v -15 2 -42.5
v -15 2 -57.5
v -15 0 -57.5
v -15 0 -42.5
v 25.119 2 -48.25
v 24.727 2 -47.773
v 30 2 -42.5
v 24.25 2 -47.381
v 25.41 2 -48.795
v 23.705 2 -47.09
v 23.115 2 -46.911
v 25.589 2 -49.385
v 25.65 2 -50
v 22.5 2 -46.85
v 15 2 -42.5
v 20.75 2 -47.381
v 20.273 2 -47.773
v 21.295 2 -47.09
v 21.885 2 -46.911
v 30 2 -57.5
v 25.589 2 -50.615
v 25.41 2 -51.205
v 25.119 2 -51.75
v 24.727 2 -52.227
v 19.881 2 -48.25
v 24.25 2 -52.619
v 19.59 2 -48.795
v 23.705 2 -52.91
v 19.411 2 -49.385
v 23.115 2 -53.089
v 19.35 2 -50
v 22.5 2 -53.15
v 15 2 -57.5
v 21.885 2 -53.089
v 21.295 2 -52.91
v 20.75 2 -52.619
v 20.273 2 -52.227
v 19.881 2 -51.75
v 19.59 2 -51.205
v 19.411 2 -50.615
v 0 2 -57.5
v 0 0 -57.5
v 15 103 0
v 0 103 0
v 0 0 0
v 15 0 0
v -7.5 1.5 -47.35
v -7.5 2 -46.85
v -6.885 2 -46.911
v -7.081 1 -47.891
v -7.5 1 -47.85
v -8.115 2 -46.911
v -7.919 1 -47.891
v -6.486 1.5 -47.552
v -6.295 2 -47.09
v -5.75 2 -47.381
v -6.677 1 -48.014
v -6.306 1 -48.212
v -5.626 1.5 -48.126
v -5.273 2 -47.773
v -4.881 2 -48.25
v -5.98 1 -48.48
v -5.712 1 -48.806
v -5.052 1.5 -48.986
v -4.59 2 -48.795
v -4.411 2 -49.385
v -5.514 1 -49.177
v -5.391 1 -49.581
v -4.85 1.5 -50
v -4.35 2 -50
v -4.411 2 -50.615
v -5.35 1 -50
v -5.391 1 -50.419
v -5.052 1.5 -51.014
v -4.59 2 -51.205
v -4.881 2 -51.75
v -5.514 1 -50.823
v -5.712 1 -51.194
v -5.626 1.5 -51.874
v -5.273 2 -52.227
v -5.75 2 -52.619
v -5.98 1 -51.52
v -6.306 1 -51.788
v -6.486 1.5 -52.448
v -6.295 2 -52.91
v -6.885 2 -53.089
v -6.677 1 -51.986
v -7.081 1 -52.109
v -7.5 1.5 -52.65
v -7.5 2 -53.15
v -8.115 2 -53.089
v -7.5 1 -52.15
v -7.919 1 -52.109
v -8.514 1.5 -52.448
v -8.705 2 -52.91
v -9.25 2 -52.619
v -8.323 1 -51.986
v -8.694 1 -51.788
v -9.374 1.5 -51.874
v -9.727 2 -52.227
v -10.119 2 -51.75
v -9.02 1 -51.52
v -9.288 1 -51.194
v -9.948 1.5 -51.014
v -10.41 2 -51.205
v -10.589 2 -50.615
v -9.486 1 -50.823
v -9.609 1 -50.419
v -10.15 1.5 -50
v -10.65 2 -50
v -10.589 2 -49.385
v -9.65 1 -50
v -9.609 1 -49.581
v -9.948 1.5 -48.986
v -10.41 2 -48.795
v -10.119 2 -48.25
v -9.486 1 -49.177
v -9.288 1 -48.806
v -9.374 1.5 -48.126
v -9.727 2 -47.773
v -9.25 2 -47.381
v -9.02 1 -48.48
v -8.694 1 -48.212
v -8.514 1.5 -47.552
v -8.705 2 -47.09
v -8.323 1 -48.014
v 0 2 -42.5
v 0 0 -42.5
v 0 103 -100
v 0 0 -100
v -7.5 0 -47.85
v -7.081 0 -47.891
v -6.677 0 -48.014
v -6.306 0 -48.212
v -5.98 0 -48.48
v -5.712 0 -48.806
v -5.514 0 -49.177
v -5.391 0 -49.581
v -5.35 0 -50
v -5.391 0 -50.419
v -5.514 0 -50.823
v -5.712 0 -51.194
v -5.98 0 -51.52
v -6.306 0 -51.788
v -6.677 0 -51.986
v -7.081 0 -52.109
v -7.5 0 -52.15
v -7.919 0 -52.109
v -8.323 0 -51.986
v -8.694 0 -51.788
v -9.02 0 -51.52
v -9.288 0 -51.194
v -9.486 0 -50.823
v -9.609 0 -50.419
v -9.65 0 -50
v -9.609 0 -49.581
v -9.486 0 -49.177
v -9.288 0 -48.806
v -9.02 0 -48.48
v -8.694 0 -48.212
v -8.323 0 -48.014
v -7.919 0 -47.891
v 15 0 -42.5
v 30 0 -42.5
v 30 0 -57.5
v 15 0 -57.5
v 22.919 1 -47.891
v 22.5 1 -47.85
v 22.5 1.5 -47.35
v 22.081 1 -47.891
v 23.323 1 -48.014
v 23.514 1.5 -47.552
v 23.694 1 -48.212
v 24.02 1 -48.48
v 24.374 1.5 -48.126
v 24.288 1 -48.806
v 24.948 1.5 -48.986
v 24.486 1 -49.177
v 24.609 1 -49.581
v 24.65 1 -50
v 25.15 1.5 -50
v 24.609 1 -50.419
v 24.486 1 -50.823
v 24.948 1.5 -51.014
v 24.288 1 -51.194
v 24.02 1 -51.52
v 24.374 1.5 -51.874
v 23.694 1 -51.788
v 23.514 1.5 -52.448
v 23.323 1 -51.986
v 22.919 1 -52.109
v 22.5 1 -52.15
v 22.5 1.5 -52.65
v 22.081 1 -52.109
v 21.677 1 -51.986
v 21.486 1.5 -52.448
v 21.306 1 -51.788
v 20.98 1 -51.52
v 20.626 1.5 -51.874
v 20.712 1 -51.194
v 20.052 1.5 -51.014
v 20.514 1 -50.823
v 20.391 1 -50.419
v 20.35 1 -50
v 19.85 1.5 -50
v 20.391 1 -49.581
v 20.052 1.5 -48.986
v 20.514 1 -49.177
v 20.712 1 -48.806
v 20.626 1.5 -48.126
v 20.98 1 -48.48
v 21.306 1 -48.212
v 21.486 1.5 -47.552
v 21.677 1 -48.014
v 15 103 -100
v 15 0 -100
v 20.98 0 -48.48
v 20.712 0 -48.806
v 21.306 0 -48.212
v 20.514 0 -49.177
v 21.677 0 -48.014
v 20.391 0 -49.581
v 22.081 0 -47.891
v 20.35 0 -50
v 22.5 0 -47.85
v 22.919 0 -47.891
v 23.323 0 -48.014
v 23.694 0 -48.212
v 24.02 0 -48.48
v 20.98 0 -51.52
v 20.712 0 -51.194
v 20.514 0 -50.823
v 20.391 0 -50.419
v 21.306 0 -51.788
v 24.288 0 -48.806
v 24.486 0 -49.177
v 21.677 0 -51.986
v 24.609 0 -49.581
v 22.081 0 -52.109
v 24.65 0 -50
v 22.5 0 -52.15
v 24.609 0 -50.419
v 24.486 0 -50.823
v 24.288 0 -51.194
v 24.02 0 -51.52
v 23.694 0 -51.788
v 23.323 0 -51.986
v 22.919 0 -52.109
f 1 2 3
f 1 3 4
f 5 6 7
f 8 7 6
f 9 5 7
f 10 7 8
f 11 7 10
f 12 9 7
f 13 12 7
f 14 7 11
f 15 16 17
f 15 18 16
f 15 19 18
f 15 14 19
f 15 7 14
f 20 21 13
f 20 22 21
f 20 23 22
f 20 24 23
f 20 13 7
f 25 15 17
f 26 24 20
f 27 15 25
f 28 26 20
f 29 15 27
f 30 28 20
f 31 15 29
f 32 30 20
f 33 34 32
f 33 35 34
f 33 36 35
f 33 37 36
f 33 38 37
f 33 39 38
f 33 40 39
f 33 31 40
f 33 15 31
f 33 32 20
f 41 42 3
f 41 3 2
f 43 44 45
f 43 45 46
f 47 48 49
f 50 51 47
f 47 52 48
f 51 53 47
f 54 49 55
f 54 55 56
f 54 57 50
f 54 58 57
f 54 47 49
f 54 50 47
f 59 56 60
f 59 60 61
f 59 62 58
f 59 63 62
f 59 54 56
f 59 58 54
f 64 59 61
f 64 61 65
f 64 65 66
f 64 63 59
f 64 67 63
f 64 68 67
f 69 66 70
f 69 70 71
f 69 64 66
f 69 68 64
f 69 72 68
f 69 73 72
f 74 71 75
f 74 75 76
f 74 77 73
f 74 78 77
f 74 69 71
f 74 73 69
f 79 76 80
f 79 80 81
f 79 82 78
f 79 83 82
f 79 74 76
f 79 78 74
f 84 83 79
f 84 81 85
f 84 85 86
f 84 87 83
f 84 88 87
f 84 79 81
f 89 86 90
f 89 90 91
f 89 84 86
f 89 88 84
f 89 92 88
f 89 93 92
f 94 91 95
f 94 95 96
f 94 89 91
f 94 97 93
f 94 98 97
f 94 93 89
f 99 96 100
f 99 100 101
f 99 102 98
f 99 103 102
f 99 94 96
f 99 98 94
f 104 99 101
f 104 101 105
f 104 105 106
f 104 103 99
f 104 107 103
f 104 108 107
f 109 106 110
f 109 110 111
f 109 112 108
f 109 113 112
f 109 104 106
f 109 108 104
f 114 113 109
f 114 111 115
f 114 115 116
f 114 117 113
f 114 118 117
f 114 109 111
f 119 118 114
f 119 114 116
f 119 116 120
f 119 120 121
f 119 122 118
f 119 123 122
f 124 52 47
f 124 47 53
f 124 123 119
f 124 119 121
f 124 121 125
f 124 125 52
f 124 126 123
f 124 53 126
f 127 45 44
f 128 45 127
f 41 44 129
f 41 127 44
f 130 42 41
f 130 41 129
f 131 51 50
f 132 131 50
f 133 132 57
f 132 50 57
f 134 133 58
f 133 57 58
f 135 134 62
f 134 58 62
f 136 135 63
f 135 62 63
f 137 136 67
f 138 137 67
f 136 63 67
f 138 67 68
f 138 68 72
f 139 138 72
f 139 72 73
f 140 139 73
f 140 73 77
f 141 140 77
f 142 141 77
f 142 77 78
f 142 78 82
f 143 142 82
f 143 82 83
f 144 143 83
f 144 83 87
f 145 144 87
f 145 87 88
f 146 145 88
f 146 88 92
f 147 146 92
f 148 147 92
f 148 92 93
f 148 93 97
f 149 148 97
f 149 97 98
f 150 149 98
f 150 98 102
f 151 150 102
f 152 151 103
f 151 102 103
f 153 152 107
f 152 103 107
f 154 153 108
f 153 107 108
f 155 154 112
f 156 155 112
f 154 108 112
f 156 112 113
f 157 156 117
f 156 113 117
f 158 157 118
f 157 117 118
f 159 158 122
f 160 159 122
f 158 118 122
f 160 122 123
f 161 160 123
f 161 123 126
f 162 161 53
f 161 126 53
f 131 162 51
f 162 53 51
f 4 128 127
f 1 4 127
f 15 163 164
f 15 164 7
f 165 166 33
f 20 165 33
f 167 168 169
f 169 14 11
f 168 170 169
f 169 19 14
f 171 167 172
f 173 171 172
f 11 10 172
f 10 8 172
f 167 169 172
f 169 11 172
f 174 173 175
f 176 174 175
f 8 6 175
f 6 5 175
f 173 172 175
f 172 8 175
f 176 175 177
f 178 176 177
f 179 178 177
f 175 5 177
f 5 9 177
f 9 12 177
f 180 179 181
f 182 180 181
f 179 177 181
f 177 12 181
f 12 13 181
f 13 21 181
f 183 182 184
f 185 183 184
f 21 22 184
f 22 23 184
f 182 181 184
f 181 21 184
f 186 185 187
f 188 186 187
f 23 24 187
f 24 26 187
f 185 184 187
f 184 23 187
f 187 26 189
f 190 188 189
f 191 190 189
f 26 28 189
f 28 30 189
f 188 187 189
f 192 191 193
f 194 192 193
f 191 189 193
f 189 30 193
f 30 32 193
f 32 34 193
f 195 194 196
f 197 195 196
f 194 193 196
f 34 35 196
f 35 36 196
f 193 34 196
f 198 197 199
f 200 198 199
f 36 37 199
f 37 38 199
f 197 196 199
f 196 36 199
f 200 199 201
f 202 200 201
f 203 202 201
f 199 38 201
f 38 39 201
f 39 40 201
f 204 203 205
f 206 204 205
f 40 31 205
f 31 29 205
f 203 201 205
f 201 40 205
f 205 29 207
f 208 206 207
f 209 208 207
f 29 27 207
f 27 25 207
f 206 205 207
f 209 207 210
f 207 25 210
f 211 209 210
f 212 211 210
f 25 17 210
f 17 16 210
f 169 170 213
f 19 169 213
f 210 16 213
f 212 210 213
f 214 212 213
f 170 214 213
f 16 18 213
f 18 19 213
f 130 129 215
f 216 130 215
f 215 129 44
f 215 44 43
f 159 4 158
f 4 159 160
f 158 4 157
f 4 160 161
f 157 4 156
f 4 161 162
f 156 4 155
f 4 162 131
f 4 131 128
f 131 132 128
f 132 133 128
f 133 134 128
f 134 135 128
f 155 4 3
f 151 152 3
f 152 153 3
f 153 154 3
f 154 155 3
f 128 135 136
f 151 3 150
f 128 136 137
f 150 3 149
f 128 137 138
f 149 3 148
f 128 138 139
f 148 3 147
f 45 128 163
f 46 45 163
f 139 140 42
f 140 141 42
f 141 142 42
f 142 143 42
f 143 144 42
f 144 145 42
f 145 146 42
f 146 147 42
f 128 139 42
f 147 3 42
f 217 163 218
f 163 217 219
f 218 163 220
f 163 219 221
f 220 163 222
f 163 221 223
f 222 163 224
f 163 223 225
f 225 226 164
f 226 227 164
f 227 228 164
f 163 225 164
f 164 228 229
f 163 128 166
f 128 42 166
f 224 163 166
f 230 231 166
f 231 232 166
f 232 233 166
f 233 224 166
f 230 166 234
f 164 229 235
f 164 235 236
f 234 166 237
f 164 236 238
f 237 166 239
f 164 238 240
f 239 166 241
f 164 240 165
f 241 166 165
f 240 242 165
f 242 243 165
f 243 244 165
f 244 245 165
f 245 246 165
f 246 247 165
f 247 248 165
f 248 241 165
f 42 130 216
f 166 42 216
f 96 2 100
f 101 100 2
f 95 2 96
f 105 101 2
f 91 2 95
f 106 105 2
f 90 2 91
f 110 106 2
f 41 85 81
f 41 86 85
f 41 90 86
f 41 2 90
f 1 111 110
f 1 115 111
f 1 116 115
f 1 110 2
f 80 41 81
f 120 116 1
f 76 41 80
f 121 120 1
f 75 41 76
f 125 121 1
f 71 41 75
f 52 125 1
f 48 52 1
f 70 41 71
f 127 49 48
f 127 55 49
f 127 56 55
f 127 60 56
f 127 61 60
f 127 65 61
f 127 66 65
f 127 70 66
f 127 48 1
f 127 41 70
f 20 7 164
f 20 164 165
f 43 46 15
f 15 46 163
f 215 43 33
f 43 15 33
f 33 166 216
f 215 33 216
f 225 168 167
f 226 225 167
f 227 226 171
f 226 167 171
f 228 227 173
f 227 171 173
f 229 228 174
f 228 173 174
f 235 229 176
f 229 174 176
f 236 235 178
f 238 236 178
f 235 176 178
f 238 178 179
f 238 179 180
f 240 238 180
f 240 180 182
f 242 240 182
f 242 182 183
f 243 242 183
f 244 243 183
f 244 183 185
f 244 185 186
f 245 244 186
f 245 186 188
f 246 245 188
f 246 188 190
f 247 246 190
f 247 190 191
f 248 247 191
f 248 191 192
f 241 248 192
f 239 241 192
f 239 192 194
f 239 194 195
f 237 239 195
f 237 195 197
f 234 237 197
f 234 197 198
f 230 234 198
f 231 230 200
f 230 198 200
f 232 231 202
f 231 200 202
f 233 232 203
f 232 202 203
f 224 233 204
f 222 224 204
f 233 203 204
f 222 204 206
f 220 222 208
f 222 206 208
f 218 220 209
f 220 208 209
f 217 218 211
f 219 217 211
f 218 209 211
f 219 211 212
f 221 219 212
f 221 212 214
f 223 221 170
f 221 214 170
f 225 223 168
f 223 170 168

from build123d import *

# Parameters (mm, degrees)
SKETCH1_W           = 15
SKETCH1_H           = 100
BOSS_EXTRUDE1_DEPTH = 103
SKETCH2_W           = 15
SKETCH2_H           = 2
BOSS_EXTRUDE2_DEPTH = 15
SKETCH3_W           = 15
SKETCH3_H           = 2
BOSS_EXTRUDE3_DEPTH = 15
SKETCH4_R           = 2.15
CUT_EXTRUDE1_DEPTH  = 15
CHAMFER1_SIZE       = 1


with BuildPart() as part:
    # Sketch1 → Boss-Extrude1 (new body)
    with BuildSketch(Plane(origin=(0, 0, 0), x_dir=(1, 0, 0), z_dir=(0, 1, 0))):
        with Locations((7.5, 50)):
            Rectangle(SKETCH1_W, SKETCH1_H)
    extrude(amount=BOSS_EXTRUDE1_DEPTH)

    # Sketch2 → Boss-Extrude2 (add)
    with BuildSketch(Plane.ZY):
        with Locations((-50, 1)):
            Rectangle(SKETCH2_W, SKETCH2_H)
    extrude(amount=BOSS_EXTRUDE2_DEPTH)

    # Sketch3 → Boss-Extrude3 (add)
    with BuildSketch(Plane(origin=(15, 0, 0), x_dir=(0, 0, -1), z_dir=(1, 0, 0))):
        with Locations((50, 1)):
            Rectangle(SKETCH3_W, SKETCH3_H)
    extrude(amount=BOSS_EXTRUDE3_DEPTH)

    # Sketch4 → Cut-Extrude1 (cut)
    with BuildSketch(Plane(origin=(0, 2, 0), x_dir=(1, 0, 0), z_dir=(0, 1, 0))):
        with Locations(Location((-7.5, 50, 0), (0, 0, 270))):
            Circle(SKETCH4_R)
        with Locations(Location((22.5, 50, 0), (0, 0, 270))):
            Circle(SKETCH4_R)
    extrude(amount=-CUT_EXTRUDE1_DEPTH, mode=Mode.SUBTRACT)

    # Chamfer1
    chamfer1_edges = [part.edges().sort_by_distance(p)[0] for p in [
        (-7.5, 2, -52.15),
        (22.5, 2, -52.15),
    ]]
    chamfer(chamfer1_edges, length=CHAMFER1_SIZE)


solid = part.part
